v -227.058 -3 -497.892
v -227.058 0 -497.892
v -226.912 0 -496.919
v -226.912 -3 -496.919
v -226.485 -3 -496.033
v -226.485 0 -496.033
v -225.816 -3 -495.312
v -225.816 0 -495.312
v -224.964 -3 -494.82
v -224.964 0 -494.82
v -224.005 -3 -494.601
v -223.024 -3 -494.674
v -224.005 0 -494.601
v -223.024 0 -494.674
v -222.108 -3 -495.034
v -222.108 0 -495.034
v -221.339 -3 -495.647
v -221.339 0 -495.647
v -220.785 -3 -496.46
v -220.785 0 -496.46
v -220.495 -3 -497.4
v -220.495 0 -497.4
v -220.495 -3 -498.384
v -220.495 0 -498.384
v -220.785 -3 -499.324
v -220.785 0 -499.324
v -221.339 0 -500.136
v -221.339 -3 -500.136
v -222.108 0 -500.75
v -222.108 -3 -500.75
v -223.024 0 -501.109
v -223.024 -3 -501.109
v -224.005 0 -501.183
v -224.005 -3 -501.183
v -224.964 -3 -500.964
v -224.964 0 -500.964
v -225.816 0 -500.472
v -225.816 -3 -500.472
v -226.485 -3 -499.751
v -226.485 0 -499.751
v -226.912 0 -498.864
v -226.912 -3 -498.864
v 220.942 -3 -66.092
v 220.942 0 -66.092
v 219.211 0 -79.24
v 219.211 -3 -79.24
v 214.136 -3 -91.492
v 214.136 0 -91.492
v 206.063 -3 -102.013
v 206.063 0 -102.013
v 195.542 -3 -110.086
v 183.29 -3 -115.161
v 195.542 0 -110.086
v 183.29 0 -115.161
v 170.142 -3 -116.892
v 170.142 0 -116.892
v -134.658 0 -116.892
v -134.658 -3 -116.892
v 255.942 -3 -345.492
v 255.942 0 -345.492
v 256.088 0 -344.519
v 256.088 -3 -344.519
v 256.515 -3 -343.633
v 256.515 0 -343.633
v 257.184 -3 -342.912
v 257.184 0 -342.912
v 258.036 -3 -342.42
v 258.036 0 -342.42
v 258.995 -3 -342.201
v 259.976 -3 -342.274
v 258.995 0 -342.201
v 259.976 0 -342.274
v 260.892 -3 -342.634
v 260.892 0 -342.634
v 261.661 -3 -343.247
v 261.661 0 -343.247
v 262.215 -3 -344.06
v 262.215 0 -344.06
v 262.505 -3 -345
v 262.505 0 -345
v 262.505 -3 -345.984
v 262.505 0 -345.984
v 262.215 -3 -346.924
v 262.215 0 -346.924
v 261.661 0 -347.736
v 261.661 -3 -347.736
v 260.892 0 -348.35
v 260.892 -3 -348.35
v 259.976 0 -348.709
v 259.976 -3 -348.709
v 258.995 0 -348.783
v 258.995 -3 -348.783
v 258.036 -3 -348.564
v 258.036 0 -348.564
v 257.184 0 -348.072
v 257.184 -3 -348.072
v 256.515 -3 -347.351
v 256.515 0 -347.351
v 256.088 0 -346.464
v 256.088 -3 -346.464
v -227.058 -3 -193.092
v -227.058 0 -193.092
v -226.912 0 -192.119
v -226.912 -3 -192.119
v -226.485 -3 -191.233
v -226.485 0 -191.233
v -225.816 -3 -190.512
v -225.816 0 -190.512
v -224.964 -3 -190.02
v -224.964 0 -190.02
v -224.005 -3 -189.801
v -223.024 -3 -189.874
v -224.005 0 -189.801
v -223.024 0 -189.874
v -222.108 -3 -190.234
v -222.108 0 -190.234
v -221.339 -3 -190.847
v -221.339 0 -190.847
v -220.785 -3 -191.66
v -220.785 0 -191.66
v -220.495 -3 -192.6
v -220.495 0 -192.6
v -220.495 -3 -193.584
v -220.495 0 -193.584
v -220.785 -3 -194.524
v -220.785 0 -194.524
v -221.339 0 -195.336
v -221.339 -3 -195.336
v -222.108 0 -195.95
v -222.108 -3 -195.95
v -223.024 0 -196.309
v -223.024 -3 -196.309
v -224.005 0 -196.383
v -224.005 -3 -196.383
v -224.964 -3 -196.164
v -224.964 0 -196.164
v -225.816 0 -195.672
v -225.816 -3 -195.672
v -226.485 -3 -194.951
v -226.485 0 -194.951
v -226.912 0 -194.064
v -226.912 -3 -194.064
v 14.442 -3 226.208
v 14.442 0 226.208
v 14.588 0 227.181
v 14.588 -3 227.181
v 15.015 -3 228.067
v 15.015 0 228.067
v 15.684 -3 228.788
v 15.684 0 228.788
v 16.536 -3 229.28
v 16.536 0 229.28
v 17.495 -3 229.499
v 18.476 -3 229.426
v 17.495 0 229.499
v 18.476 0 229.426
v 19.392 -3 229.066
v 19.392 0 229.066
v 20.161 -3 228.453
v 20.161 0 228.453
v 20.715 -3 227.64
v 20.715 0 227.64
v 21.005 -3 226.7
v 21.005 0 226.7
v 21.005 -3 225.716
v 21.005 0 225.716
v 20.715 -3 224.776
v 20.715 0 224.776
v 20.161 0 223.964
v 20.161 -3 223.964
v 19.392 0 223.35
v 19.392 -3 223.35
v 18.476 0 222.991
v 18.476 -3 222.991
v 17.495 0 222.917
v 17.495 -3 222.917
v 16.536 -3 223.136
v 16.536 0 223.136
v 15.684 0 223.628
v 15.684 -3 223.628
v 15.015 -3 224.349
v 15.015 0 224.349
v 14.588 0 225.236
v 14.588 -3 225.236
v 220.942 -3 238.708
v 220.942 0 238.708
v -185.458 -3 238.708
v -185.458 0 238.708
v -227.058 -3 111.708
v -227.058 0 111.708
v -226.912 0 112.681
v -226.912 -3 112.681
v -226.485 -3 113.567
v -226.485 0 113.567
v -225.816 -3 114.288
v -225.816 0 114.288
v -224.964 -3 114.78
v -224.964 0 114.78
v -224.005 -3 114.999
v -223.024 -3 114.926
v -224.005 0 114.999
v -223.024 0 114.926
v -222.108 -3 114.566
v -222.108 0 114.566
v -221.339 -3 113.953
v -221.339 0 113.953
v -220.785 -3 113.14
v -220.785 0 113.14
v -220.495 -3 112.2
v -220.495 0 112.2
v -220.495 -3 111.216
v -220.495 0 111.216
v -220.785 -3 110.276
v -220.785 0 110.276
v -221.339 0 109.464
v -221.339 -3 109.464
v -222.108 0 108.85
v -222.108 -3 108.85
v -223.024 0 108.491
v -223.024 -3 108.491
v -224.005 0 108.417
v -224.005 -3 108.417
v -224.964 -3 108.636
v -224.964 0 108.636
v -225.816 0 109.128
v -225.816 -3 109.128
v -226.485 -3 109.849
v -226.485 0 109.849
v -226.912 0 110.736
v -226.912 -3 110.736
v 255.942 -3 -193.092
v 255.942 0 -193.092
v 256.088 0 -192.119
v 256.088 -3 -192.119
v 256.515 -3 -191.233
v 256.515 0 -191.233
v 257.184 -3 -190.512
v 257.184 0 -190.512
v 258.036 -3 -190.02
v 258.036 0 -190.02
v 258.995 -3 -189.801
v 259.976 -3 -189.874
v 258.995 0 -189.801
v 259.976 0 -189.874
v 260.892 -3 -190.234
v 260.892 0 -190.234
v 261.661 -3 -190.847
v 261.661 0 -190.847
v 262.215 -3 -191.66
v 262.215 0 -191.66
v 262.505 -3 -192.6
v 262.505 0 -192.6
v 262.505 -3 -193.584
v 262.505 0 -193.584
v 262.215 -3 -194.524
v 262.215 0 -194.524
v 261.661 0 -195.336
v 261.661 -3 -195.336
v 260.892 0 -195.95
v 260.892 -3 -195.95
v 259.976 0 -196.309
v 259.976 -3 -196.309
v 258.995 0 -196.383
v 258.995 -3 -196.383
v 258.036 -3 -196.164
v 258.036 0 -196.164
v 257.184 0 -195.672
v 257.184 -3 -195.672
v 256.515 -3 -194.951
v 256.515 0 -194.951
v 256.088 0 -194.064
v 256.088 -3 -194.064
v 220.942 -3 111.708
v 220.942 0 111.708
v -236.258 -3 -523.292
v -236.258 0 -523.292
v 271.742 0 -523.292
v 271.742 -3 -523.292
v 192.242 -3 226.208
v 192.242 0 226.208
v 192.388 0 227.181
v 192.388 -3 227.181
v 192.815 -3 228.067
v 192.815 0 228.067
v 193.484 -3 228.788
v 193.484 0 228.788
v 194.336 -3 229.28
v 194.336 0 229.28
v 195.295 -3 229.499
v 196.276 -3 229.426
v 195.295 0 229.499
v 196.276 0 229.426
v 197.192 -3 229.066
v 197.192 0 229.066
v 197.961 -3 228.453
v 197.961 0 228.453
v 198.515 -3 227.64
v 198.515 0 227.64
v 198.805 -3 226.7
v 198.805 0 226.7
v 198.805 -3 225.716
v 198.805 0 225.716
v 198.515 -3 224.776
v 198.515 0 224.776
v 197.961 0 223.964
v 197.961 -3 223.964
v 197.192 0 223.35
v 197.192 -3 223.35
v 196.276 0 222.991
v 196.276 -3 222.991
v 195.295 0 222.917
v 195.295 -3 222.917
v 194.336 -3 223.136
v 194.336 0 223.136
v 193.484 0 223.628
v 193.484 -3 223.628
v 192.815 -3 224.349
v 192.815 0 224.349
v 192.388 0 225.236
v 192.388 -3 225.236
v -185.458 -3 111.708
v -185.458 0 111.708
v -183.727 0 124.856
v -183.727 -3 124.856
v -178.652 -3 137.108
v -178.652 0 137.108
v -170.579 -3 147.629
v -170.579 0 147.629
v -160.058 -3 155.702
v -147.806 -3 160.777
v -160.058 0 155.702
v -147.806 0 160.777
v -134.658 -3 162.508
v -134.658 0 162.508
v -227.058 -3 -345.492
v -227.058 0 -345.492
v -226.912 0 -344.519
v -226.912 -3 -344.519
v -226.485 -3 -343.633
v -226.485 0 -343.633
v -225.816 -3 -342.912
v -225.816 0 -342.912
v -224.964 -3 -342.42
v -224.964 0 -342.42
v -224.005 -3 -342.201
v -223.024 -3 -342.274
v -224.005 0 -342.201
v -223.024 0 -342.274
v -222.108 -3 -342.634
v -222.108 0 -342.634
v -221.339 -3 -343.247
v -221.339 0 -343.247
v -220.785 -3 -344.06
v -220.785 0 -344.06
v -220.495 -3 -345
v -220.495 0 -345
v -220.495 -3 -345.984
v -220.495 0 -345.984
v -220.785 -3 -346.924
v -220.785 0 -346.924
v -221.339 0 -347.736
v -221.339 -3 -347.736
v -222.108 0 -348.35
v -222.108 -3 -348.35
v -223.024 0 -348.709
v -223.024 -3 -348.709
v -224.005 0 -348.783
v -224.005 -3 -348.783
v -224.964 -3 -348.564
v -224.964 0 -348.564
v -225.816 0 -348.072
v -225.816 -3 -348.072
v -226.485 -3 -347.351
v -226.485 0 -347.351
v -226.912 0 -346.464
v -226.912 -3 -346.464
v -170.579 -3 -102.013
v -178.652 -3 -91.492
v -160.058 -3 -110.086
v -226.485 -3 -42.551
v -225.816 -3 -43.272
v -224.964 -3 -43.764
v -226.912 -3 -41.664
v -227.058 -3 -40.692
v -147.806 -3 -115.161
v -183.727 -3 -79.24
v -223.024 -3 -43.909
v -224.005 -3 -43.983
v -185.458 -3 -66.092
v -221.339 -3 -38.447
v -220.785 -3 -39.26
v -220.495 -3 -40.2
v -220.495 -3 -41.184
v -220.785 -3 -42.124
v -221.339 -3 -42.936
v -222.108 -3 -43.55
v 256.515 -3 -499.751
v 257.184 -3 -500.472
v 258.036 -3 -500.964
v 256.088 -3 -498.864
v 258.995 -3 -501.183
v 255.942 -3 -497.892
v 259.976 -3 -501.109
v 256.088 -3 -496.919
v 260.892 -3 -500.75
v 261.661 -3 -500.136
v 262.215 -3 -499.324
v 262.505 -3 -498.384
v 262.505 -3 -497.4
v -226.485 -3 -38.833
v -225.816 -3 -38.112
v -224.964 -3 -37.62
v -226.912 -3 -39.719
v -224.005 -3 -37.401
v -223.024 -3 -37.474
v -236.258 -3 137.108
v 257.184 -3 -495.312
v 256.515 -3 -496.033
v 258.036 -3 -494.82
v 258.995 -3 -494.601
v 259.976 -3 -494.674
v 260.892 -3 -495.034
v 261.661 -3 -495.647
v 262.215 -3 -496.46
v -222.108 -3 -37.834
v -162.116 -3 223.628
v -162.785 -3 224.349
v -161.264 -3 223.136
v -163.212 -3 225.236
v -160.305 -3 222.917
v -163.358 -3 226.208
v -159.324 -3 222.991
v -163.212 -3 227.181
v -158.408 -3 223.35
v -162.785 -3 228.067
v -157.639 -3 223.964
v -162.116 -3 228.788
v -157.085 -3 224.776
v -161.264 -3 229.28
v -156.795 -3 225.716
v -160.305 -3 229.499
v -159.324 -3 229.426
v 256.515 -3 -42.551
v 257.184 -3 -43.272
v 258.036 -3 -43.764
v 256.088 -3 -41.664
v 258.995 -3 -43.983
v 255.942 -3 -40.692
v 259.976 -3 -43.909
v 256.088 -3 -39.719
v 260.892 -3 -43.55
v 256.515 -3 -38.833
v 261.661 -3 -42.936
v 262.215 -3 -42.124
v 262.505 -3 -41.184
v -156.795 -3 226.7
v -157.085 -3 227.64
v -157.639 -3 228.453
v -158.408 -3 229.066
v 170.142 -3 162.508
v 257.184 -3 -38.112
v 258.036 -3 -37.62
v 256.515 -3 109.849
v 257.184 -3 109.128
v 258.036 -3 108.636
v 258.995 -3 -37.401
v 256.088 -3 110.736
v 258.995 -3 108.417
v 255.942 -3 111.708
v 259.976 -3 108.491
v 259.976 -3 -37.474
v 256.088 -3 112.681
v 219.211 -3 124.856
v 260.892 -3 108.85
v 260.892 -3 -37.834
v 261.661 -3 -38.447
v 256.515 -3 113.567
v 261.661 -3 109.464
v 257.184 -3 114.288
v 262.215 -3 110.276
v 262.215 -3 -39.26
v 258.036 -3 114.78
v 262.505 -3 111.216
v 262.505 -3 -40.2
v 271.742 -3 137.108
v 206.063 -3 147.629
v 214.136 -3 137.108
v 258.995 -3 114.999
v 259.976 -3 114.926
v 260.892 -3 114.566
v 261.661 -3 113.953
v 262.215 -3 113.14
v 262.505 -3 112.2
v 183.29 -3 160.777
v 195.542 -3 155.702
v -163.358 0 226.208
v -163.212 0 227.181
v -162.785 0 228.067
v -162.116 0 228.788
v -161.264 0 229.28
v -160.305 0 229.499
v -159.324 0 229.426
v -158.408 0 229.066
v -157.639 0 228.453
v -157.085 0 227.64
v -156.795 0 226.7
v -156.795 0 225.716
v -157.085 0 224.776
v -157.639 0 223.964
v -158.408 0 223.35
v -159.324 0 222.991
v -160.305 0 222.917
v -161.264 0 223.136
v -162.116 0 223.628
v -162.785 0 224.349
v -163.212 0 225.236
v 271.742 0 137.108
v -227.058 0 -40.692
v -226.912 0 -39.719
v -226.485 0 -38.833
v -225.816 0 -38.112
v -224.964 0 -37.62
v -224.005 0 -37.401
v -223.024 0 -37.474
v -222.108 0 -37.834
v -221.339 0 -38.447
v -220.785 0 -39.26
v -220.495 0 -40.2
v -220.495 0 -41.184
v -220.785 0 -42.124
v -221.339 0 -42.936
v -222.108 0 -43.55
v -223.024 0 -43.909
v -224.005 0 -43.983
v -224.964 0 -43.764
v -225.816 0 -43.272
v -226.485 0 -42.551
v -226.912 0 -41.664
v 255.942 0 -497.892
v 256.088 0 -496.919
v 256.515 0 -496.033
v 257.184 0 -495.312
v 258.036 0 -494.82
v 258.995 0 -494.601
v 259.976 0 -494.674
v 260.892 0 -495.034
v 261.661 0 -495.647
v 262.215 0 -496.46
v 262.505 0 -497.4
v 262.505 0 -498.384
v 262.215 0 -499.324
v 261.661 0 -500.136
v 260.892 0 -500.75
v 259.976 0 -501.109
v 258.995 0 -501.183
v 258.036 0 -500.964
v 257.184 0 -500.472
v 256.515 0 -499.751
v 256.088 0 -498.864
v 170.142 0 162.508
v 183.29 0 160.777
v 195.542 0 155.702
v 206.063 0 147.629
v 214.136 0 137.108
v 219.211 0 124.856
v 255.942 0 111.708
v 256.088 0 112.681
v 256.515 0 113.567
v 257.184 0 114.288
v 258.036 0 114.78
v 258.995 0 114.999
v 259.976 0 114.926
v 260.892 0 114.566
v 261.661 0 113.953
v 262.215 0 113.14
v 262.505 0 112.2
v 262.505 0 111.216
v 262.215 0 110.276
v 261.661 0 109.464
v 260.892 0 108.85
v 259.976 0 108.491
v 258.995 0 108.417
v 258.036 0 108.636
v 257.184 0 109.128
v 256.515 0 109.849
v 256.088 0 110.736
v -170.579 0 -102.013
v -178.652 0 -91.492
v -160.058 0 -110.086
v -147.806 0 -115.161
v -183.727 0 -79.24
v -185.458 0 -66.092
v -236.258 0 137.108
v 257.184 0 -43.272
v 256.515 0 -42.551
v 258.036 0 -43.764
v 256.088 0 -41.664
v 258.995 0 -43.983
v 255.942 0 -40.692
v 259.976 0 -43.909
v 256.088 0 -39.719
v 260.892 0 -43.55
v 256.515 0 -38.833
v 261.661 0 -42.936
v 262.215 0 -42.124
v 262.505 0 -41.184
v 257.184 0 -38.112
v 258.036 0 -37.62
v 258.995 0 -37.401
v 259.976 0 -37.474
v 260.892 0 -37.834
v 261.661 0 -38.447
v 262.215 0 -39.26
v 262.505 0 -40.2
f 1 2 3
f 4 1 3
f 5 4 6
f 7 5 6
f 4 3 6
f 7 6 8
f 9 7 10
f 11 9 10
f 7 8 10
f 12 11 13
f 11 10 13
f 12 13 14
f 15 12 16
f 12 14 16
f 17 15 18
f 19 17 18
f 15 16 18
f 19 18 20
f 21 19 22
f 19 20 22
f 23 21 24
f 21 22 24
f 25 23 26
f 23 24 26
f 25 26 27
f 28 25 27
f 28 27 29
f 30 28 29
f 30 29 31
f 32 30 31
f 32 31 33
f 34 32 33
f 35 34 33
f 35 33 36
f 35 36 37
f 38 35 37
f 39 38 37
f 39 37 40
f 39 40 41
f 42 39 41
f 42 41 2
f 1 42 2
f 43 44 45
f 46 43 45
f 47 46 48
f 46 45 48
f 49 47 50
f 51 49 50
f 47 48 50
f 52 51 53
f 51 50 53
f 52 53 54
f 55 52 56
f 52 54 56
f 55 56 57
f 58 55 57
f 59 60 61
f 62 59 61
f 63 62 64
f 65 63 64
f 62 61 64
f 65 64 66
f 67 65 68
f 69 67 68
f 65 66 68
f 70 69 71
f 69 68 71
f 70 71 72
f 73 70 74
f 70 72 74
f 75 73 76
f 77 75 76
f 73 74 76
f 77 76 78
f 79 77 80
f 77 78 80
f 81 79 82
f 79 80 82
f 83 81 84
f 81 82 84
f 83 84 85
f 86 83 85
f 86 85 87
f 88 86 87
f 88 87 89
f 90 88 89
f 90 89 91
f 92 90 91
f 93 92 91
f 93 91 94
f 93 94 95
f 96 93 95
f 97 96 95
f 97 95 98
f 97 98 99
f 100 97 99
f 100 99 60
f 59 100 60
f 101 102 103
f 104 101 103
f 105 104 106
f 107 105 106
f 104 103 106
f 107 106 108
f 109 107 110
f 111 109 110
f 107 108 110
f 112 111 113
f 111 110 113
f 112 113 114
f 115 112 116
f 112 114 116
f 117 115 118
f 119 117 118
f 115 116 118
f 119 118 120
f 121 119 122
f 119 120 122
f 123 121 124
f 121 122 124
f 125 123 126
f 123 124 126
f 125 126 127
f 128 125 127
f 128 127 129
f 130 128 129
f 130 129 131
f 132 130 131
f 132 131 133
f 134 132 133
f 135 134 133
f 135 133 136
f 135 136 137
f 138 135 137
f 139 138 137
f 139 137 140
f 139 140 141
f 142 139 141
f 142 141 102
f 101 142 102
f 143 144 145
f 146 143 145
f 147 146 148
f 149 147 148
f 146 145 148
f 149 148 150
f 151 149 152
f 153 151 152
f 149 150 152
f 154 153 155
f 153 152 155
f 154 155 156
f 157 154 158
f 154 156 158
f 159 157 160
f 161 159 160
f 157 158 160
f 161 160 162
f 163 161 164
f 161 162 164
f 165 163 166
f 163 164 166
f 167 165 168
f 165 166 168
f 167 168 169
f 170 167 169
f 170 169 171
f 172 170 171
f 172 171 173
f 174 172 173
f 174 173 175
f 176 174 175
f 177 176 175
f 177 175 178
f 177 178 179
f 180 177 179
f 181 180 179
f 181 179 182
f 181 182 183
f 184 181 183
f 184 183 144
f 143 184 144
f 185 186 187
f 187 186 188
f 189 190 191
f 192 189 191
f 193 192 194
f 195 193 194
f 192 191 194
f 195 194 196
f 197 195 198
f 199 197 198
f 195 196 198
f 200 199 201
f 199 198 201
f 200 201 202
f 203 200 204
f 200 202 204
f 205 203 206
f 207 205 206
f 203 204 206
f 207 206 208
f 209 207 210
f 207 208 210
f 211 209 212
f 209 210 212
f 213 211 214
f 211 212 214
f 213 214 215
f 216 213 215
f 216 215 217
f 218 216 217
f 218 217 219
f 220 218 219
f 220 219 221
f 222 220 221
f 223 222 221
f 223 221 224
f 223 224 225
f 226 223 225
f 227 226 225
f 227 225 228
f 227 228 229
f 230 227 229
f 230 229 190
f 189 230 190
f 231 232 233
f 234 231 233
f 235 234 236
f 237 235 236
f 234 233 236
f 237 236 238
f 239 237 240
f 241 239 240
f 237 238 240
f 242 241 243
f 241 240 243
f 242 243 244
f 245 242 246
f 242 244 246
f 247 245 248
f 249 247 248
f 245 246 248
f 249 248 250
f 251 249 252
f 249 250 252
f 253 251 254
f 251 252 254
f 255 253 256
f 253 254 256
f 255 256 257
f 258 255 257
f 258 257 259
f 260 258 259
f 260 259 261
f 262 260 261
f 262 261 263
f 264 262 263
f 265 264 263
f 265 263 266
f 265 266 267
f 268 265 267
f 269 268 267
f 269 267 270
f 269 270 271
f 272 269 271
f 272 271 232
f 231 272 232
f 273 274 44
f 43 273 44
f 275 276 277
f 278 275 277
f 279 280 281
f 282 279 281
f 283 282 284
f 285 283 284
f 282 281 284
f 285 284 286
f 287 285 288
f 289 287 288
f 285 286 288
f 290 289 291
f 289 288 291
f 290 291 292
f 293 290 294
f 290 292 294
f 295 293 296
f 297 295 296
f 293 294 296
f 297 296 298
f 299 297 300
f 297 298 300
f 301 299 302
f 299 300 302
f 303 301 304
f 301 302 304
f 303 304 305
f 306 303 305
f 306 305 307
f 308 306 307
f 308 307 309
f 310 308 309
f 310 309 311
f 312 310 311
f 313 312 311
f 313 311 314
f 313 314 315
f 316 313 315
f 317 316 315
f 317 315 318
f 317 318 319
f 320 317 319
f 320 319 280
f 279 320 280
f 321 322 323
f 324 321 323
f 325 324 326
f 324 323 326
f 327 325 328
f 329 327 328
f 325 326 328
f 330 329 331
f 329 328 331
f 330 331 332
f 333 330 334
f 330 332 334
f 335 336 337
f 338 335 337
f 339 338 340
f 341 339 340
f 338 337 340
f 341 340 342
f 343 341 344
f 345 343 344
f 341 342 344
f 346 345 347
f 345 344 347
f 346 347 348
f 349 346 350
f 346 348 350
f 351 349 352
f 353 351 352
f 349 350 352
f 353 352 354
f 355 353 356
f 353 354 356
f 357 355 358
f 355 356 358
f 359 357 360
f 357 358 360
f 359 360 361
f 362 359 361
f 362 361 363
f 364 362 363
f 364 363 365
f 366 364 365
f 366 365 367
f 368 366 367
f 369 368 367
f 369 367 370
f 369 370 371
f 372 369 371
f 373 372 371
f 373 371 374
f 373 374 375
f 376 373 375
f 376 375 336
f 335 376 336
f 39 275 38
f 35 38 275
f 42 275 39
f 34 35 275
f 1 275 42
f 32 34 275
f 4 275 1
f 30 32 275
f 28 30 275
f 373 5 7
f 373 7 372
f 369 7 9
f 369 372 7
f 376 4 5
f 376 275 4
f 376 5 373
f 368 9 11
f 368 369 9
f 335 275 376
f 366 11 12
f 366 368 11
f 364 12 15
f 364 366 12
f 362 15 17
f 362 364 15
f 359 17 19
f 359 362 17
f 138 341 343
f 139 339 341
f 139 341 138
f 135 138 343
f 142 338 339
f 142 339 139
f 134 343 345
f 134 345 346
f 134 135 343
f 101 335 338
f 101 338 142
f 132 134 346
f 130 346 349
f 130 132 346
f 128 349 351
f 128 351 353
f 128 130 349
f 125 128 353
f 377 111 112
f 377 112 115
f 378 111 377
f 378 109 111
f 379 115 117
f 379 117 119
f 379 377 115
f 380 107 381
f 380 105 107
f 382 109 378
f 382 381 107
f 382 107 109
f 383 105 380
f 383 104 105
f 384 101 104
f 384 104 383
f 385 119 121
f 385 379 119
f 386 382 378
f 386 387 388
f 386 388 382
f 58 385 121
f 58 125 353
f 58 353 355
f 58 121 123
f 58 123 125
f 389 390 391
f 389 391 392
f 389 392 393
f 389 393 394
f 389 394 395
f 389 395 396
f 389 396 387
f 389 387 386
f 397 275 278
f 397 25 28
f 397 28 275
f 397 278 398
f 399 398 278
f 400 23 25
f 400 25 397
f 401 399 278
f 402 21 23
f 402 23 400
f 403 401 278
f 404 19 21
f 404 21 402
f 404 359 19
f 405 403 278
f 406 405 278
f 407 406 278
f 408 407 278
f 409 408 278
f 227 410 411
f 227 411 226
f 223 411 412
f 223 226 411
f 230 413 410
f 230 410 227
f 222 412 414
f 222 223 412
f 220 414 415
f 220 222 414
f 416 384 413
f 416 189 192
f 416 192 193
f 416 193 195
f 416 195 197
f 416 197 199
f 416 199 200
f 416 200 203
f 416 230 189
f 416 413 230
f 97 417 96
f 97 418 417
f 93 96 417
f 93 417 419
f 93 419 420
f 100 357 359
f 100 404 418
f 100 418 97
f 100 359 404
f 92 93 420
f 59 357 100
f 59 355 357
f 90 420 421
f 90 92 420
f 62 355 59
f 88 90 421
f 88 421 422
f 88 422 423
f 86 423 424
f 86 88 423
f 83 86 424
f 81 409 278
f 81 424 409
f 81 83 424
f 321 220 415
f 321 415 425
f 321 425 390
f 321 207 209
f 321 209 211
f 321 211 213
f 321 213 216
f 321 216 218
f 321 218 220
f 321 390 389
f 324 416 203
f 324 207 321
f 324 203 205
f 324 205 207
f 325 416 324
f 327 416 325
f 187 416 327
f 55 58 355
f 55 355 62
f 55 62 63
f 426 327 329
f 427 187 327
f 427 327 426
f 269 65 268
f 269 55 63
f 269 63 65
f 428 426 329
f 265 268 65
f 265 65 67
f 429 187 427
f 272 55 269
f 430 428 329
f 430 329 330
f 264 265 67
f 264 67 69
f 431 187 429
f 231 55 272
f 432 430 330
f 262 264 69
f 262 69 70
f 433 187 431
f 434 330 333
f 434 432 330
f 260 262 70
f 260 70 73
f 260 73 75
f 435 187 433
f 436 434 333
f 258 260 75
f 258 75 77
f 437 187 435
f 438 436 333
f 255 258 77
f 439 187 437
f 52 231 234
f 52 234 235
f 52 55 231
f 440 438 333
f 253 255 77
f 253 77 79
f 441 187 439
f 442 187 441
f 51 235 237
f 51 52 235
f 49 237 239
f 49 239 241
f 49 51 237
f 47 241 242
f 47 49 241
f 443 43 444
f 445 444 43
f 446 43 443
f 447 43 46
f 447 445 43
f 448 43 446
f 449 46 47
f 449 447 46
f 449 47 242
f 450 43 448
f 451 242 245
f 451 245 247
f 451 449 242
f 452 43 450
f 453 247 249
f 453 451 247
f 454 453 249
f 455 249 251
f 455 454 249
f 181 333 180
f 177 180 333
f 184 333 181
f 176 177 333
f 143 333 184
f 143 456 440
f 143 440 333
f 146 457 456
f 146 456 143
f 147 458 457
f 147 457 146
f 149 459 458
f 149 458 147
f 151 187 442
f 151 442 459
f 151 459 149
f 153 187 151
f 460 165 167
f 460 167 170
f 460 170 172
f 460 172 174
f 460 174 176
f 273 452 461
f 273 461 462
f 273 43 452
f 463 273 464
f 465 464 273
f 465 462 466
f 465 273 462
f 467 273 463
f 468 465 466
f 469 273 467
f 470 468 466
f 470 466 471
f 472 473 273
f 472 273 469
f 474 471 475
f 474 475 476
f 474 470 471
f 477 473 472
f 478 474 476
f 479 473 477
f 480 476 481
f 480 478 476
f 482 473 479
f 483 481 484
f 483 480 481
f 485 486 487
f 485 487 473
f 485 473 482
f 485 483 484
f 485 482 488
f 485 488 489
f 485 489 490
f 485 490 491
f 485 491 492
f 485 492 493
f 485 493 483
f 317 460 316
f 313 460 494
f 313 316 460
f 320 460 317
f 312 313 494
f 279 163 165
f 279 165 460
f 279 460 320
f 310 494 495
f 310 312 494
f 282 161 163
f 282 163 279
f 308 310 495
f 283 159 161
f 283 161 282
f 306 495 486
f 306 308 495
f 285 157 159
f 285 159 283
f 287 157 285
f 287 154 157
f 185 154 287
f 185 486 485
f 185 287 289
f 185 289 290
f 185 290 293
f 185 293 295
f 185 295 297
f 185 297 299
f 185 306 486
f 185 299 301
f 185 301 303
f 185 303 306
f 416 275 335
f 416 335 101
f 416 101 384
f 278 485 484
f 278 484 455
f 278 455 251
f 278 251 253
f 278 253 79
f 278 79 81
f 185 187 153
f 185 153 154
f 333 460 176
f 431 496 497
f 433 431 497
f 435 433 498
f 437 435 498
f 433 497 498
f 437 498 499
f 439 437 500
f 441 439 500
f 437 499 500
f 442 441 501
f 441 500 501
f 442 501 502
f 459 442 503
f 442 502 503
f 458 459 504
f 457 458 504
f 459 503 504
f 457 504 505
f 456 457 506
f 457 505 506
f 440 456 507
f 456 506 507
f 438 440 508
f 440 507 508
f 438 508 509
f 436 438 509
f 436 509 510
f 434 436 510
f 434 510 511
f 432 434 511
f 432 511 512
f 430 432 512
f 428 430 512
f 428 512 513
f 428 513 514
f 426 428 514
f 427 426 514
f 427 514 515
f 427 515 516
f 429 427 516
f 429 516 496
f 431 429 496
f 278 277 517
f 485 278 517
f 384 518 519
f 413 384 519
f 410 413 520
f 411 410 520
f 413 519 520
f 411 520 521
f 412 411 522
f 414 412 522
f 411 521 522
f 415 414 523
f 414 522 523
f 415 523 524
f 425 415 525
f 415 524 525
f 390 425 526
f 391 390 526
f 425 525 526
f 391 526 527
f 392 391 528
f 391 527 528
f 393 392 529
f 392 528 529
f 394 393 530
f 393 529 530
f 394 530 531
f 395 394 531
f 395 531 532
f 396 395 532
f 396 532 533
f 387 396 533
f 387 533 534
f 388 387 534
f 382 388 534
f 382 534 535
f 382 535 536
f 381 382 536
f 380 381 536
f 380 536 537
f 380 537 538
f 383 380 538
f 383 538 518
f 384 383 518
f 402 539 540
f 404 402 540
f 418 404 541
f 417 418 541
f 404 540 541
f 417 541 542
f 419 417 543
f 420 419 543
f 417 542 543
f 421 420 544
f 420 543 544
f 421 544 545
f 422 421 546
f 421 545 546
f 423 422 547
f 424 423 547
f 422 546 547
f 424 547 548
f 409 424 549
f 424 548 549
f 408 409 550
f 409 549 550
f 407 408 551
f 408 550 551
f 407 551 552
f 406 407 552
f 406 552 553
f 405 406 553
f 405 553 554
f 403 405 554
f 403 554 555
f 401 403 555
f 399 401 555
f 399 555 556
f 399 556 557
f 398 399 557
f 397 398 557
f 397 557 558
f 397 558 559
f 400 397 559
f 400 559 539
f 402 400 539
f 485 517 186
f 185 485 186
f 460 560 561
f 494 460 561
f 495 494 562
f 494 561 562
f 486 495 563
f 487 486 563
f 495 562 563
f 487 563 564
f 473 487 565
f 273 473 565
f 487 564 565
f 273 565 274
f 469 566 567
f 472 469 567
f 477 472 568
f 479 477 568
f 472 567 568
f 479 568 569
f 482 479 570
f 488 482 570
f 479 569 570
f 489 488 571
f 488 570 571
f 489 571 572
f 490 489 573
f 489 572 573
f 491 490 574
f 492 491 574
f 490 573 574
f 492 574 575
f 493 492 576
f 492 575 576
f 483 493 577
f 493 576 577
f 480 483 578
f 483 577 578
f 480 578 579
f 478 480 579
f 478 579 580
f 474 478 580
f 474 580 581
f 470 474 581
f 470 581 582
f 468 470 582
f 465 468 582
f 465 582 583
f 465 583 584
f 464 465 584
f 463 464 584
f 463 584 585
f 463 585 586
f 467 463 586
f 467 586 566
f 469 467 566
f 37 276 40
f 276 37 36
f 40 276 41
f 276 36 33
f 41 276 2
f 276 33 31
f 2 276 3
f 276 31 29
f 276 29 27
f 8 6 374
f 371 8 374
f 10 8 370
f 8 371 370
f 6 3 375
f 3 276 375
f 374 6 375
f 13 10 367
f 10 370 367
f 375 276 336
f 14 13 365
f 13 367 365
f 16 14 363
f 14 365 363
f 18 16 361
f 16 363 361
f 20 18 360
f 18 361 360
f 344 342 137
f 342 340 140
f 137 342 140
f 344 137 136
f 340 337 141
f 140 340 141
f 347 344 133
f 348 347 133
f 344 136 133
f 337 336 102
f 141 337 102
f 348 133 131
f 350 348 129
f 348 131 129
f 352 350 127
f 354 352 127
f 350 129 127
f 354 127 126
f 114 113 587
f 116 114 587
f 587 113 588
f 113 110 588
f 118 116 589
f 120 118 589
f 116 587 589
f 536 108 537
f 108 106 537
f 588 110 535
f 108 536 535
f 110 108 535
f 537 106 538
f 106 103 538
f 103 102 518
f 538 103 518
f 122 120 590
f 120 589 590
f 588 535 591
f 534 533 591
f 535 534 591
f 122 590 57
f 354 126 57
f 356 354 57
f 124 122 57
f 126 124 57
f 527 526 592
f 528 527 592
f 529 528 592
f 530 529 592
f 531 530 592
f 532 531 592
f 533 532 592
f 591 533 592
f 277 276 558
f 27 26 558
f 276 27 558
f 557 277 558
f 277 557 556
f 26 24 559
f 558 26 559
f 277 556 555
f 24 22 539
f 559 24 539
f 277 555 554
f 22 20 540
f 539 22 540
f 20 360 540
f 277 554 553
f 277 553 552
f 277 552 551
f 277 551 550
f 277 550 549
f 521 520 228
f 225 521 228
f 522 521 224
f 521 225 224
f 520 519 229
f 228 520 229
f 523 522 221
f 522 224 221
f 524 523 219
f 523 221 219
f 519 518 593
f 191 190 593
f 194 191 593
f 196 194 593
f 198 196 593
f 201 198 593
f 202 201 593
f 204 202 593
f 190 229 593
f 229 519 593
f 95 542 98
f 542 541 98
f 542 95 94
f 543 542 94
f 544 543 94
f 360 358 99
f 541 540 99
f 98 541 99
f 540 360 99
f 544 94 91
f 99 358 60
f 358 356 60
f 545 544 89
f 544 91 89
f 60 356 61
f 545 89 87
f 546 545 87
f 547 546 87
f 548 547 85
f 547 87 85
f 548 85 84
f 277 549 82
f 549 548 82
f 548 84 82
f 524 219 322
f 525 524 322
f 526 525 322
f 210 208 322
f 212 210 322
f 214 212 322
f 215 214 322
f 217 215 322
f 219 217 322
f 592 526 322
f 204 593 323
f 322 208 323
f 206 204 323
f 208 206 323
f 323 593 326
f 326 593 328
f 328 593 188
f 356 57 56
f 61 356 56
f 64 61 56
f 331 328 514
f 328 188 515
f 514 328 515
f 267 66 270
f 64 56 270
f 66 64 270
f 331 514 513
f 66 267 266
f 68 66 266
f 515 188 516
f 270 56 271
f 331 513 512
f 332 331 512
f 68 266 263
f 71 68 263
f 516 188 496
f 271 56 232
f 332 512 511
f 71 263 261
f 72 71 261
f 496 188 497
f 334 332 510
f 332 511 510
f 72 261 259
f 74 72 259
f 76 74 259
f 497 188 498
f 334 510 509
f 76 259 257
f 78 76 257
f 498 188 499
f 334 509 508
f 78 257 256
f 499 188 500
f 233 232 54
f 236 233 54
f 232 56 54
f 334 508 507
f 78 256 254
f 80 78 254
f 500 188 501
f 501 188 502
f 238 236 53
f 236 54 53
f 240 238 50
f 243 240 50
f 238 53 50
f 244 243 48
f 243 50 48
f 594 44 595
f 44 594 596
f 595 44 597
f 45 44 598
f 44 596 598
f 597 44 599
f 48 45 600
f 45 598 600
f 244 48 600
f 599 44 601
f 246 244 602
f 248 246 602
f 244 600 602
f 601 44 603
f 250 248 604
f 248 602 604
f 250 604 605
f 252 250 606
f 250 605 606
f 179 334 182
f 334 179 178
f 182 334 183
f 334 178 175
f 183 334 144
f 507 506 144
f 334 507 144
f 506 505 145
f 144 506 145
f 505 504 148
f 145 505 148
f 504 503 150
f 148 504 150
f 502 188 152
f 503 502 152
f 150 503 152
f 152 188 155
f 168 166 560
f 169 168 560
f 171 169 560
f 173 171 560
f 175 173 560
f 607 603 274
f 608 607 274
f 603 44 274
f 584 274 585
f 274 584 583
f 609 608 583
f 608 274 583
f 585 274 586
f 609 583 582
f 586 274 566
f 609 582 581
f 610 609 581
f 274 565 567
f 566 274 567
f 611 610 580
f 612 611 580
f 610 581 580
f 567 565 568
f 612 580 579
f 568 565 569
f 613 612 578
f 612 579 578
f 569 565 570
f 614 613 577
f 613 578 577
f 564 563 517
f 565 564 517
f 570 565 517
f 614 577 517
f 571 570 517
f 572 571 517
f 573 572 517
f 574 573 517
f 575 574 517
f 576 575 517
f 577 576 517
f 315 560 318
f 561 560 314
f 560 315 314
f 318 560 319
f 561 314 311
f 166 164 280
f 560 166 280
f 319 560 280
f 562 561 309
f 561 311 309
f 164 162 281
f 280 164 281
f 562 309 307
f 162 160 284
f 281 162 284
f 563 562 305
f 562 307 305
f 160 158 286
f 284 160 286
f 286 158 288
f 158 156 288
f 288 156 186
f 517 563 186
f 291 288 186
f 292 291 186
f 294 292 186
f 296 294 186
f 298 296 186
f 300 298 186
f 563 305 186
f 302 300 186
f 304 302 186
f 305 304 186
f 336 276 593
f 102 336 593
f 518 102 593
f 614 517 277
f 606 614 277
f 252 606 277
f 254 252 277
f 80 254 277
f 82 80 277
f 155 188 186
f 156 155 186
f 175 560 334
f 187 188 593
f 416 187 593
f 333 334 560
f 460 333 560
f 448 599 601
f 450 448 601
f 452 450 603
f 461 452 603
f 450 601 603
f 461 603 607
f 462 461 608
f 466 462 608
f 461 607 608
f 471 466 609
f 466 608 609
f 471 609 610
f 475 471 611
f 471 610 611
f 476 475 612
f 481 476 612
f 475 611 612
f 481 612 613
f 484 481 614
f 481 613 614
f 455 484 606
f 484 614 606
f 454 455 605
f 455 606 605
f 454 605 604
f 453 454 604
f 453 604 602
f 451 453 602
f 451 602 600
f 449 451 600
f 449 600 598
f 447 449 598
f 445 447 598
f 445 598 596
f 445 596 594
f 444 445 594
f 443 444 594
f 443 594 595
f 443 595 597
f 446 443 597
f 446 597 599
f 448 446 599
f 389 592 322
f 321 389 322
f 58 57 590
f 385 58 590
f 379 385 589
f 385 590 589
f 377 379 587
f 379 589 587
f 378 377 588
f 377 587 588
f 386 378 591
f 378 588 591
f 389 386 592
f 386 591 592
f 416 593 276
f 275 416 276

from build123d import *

# Parameters (mm, degrees)
F1_DEPTH = 3
F3_D     = 6.6


with BuildPart() as f1:
    # F0 (on Front) → F1 (new body)
    with BuildSketch(Plane.XZ):
        Polygon((-236.2583571076, 137.1082649553), (-236.2583571076, -523.2917350447), (271.7416428924, -523.2917350447), (271.7416428924, 137.1082649553), (220.9416428924, 238.7082649553), (-185.4583571076, 238.7082649553), align=None)
        with BuildLine():
            ThreePointArc((-185.4583571076, 111.7082649553), (-170.5793815919, 147.6292894396), (-134.6583571076, 162.5082649553))
            Line((-134.6583571076, 162.5082649553), (170.1416428924, 162.5082649553))
            ThreePointArc((170.1416428924, 162.5082649553), (206.0626673766, 147.6292894396), (220.9416428924, 111.7082649553))
            Line((220.9416428924, 111.7082649553), (220.9416428924, -66.0917350447))
            ThreePointArc((220.9416428924, -66.0917350447), (206.0626673766, -102.012759529), (170.1416428924, -116.8917350447))
            Line((170.1416428924, -116.8917350447), (-134.6583571076, -116.8917350447))
            ThreePointArc((-134.6583571076, -116.8917350447), (-170.5793815919, -102.012759529), (-185.4583571076, -66.0917350447))
            Line((-185.4583571076, -66.0917350447), (-185.4583571076, 111.7082649553))
        make_face(mode=Mode.SUBTRACT)
    extrude(amount=F1_DEPTH)

    # F3 (through all)
    with Locations(Plane.XZ.offset(3)):
        with Locations((-223.7583571076, -497.8917350447), (-223.7583571076, -345.4917350447), (-223.7583571076, -193.0917350447), (-223.7583571076, -40.6917350447), (-223.7583571076, 111.7082649553), (-160.0583571076, 226.2082649553), (17.7416428924, 226.2082649553), (195.5416428924, 226.2082649553), (259.2416428924, 111.7082649553), (259.2416428924, -40.6917350447), (259.2416428924, -193.0917350447), (259.2416428924, -345.4917350447), (259.2416428924, -497.8917350447)):
            Hole(F3_D / 2)


solid = f1.part
